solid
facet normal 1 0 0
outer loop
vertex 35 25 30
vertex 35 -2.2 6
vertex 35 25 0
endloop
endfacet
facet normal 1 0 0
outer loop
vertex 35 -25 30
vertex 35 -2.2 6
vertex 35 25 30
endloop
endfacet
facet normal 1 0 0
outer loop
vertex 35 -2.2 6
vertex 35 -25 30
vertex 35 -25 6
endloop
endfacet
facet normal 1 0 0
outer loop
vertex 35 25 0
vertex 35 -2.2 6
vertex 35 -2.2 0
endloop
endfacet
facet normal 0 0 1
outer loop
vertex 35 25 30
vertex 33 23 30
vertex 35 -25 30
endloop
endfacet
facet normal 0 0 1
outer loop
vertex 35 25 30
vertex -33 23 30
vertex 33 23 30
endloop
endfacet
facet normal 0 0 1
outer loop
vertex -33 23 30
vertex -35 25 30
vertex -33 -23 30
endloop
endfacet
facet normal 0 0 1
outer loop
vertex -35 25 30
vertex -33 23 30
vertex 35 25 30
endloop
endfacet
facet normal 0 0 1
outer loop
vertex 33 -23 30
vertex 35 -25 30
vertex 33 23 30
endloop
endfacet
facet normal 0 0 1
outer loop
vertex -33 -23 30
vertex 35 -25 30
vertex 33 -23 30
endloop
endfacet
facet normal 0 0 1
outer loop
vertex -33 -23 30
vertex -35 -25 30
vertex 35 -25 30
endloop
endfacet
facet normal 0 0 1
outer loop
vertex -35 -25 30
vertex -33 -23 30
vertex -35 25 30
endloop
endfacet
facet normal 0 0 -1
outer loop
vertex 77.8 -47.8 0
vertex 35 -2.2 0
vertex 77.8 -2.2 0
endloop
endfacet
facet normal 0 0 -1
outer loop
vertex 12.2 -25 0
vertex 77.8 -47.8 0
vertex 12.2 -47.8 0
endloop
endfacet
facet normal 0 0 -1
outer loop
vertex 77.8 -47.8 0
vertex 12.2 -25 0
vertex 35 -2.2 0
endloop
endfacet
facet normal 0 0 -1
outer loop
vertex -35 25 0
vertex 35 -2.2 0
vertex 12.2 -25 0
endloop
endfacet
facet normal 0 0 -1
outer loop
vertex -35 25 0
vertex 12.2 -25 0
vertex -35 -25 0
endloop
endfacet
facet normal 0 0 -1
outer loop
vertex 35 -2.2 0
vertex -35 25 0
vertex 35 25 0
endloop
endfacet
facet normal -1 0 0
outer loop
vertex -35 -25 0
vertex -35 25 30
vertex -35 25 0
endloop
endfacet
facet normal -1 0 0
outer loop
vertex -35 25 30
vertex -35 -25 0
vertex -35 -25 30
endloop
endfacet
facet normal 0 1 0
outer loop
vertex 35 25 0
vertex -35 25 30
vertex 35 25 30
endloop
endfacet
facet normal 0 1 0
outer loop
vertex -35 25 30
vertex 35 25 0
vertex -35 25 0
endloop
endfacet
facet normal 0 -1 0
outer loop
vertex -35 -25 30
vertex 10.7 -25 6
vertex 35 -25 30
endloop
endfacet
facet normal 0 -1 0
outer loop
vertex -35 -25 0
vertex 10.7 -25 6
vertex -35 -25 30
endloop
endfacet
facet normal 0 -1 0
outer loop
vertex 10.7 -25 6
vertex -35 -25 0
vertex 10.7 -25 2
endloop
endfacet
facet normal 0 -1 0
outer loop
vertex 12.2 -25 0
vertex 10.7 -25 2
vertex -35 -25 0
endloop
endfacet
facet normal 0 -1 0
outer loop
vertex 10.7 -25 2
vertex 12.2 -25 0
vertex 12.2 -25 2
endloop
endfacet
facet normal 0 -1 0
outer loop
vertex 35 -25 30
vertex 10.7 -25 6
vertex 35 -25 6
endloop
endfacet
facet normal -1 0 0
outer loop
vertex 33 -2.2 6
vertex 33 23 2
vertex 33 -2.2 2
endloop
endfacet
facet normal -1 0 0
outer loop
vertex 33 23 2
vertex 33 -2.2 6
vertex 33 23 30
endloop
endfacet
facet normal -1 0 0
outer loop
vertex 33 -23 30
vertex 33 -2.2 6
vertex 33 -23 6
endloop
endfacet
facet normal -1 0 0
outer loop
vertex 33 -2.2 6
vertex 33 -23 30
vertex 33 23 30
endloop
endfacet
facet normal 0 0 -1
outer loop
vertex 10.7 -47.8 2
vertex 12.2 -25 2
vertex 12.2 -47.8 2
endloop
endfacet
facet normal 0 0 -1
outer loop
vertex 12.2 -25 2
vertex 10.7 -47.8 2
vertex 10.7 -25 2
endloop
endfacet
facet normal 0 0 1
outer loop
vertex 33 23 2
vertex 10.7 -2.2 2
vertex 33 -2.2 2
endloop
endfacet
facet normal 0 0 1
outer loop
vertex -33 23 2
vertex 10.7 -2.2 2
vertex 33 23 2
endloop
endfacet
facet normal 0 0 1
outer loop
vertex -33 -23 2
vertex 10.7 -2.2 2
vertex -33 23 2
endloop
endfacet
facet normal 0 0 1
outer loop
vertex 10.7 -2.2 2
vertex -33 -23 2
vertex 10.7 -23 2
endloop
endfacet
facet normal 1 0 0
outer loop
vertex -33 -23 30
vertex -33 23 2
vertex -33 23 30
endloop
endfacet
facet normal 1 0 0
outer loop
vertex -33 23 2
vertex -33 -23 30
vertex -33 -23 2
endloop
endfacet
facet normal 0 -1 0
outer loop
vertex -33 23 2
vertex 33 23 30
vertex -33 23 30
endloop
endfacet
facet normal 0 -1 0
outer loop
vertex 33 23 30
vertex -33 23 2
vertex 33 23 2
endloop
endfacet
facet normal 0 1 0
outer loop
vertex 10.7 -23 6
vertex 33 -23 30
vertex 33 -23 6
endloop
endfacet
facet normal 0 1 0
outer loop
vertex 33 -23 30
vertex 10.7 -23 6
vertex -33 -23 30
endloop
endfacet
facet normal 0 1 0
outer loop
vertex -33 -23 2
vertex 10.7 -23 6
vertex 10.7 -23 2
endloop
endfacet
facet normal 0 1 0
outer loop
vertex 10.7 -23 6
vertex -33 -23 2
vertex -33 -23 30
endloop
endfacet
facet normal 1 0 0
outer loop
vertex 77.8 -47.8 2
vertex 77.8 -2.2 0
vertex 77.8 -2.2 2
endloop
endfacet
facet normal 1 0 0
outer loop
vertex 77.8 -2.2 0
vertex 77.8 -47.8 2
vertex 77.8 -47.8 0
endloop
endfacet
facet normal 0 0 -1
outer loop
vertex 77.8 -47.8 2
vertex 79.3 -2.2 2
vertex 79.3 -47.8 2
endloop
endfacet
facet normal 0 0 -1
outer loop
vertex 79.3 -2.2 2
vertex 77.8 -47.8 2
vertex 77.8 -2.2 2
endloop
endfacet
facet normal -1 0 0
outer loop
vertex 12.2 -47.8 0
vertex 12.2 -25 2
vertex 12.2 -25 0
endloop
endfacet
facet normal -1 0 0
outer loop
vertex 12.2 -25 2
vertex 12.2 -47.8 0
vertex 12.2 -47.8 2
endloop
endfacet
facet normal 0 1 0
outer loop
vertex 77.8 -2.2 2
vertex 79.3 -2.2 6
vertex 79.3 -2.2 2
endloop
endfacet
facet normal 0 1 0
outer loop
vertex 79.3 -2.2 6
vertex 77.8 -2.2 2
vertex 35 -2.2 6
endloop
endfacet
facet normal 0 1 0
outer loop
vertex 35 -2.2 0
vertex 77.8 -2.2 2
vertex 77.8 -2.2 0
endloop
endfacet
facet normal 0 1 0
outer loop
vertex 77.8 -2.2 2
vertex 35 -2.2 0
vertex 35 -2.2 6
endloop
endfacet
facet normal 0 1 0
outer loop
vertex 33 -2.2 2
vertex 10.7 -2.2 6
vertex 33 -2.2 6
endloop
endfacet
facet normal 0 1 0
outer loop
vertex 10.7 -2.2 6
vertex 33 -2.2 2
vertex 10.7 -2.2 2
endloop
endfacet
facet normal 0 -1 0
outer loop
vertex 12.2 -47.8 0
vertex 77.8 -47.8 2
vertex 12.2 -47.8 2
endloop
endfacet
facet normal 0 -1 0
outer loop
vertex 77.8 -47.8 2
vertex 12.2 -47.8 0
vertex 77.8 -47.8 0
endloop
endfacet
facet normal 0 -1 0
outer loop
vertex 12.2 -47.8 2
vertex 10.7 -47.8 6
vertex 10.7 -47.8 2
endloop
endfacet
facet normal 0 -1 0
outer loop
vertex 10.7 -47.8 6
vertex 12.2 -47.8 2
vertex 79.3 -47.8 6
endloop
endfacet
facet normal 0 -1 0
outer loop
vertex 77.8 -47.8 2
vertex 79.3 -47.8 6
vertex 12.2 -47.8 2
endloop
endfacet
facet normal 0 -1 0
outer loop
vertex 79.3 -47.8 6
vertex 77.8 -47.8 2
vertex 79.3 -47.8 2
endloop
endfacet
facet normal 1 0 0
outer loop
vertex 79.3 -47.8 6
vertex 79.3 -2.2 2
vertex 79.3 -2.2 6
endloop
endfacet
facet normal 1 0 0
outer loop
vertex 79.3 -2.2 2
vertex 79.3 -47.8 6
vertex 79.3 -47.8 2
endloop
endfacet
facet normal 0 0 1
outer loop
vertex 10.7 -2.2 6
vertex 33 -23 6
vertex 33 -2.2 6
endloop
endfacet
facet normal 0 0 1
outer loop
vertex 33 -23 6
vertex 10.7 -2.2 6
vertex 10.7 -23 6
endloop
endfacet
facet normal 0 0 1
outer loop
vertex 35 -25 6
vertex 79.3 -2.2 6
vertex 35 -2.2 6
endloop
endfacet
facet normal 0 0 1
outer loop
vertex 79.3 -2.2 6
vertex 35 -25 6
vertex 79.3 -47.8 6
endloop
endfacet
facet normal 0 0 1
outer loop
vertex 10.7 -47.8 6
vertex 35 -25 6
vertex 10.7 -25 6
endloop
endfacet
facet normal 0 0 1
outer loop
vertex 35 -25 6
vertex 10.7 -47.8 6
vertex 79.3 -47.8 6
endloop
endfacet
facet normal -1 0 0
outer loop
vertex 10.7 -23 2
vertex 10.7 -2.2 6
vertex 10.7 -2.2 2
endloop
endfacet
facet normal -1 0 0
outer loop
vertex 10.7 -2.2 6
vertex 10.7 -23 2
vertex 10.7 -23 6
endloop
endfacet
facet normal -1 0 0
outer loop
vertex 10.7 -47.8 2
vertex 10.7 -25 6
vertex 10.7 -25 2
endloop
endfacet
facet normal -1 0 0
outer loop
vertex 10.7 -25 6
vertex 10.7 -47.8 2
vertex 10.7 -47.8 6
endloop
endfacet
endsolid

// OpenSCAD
// Two-part enclosure for a small electronics board (e.g. Arduino-based logger)
// Print orientation: box stands on the bed (z = 0), lid plate lies flat on the bed.
// The files were placed side by side with a 10 mm gap, so they render as one solid.

// ---------------- Parameters ----------------
box_x      = 70;    // box outer size in X (mm)
box_y      = 50;    // box outer size in Y (mm)
box_z      = 30;    // box outer size in Z (mm)
box_wall   = 2;     // box wall thickness (mm)
box_floor  = 2;     // box floor thickness (mm)

lip_x      = 65.6;  // lip outer size in X (mm)
lip_y      = 45.6;  // lip outer size in Y (mm)
lip_t      = 1.5;   // lip wall thickness (mm)
lip_h      = 4;     // lip height above plate (mm)

plate_t    = 2;     // lid plate thickness (mm)
gap        = 10;    // gap between box and lid along X (mm)

eps        = 0.5;   // cutter overshoot past faces (mm)
$fn        = 64;    // curve resolution

// ---------------- Derived ----------------
box_inner_x = box_x - 2 * box_wall;   // 66 mm
box_inner_y = box_y - 2 * box_wall;   // 46 mm
box_h       = box_z - box_floor;      // 28 mm open top

// Lip inner size = outer - 2*wall = 63.6 x 43.6 mm
// Box opening   = inner = 66 x 46 mm
// The lip is therefore 2 mm smaller in each direction: 0.2 mm clearance.
pitch_x = lip_x + 2 * lip_t;          // 66 mm = box_inner_x
pitch_y = lip_y + 2 * lip_t;          // 46 mm = box_inner_y

// ---------------- Model ----------------
union() {
    // Part 1: Box
    difference() {
        translate([-box_x / 2, -box_y / 2, 0])
            cube([box_x, box_y, box_z]);
        // Open top: cut away everything above the floor
        translate([-box_inner_x / 2, -box_inner_y / 2, box_floor])
            cube([box_inner_x, box_inner_y, box_h + eps]);
    }

    // Part 2: Lid (printed upside down, so the lip points up +Z)
    translate([box_x / 2 + gap, -box_y / 2, 0])
        union() {
            // Base plate
            translate([-lip_x / 2, -lip_y / 2, 0])
                cube([lip_x, lip_y, plate_t]);

            // Rectangular lip: wall thick in X, height in Z, full Y
            translate([-pitch_x / 2, -lip_y / 2, plate_t])
                cube([pitch_x, lip_y, lip_h]);
        }
}
